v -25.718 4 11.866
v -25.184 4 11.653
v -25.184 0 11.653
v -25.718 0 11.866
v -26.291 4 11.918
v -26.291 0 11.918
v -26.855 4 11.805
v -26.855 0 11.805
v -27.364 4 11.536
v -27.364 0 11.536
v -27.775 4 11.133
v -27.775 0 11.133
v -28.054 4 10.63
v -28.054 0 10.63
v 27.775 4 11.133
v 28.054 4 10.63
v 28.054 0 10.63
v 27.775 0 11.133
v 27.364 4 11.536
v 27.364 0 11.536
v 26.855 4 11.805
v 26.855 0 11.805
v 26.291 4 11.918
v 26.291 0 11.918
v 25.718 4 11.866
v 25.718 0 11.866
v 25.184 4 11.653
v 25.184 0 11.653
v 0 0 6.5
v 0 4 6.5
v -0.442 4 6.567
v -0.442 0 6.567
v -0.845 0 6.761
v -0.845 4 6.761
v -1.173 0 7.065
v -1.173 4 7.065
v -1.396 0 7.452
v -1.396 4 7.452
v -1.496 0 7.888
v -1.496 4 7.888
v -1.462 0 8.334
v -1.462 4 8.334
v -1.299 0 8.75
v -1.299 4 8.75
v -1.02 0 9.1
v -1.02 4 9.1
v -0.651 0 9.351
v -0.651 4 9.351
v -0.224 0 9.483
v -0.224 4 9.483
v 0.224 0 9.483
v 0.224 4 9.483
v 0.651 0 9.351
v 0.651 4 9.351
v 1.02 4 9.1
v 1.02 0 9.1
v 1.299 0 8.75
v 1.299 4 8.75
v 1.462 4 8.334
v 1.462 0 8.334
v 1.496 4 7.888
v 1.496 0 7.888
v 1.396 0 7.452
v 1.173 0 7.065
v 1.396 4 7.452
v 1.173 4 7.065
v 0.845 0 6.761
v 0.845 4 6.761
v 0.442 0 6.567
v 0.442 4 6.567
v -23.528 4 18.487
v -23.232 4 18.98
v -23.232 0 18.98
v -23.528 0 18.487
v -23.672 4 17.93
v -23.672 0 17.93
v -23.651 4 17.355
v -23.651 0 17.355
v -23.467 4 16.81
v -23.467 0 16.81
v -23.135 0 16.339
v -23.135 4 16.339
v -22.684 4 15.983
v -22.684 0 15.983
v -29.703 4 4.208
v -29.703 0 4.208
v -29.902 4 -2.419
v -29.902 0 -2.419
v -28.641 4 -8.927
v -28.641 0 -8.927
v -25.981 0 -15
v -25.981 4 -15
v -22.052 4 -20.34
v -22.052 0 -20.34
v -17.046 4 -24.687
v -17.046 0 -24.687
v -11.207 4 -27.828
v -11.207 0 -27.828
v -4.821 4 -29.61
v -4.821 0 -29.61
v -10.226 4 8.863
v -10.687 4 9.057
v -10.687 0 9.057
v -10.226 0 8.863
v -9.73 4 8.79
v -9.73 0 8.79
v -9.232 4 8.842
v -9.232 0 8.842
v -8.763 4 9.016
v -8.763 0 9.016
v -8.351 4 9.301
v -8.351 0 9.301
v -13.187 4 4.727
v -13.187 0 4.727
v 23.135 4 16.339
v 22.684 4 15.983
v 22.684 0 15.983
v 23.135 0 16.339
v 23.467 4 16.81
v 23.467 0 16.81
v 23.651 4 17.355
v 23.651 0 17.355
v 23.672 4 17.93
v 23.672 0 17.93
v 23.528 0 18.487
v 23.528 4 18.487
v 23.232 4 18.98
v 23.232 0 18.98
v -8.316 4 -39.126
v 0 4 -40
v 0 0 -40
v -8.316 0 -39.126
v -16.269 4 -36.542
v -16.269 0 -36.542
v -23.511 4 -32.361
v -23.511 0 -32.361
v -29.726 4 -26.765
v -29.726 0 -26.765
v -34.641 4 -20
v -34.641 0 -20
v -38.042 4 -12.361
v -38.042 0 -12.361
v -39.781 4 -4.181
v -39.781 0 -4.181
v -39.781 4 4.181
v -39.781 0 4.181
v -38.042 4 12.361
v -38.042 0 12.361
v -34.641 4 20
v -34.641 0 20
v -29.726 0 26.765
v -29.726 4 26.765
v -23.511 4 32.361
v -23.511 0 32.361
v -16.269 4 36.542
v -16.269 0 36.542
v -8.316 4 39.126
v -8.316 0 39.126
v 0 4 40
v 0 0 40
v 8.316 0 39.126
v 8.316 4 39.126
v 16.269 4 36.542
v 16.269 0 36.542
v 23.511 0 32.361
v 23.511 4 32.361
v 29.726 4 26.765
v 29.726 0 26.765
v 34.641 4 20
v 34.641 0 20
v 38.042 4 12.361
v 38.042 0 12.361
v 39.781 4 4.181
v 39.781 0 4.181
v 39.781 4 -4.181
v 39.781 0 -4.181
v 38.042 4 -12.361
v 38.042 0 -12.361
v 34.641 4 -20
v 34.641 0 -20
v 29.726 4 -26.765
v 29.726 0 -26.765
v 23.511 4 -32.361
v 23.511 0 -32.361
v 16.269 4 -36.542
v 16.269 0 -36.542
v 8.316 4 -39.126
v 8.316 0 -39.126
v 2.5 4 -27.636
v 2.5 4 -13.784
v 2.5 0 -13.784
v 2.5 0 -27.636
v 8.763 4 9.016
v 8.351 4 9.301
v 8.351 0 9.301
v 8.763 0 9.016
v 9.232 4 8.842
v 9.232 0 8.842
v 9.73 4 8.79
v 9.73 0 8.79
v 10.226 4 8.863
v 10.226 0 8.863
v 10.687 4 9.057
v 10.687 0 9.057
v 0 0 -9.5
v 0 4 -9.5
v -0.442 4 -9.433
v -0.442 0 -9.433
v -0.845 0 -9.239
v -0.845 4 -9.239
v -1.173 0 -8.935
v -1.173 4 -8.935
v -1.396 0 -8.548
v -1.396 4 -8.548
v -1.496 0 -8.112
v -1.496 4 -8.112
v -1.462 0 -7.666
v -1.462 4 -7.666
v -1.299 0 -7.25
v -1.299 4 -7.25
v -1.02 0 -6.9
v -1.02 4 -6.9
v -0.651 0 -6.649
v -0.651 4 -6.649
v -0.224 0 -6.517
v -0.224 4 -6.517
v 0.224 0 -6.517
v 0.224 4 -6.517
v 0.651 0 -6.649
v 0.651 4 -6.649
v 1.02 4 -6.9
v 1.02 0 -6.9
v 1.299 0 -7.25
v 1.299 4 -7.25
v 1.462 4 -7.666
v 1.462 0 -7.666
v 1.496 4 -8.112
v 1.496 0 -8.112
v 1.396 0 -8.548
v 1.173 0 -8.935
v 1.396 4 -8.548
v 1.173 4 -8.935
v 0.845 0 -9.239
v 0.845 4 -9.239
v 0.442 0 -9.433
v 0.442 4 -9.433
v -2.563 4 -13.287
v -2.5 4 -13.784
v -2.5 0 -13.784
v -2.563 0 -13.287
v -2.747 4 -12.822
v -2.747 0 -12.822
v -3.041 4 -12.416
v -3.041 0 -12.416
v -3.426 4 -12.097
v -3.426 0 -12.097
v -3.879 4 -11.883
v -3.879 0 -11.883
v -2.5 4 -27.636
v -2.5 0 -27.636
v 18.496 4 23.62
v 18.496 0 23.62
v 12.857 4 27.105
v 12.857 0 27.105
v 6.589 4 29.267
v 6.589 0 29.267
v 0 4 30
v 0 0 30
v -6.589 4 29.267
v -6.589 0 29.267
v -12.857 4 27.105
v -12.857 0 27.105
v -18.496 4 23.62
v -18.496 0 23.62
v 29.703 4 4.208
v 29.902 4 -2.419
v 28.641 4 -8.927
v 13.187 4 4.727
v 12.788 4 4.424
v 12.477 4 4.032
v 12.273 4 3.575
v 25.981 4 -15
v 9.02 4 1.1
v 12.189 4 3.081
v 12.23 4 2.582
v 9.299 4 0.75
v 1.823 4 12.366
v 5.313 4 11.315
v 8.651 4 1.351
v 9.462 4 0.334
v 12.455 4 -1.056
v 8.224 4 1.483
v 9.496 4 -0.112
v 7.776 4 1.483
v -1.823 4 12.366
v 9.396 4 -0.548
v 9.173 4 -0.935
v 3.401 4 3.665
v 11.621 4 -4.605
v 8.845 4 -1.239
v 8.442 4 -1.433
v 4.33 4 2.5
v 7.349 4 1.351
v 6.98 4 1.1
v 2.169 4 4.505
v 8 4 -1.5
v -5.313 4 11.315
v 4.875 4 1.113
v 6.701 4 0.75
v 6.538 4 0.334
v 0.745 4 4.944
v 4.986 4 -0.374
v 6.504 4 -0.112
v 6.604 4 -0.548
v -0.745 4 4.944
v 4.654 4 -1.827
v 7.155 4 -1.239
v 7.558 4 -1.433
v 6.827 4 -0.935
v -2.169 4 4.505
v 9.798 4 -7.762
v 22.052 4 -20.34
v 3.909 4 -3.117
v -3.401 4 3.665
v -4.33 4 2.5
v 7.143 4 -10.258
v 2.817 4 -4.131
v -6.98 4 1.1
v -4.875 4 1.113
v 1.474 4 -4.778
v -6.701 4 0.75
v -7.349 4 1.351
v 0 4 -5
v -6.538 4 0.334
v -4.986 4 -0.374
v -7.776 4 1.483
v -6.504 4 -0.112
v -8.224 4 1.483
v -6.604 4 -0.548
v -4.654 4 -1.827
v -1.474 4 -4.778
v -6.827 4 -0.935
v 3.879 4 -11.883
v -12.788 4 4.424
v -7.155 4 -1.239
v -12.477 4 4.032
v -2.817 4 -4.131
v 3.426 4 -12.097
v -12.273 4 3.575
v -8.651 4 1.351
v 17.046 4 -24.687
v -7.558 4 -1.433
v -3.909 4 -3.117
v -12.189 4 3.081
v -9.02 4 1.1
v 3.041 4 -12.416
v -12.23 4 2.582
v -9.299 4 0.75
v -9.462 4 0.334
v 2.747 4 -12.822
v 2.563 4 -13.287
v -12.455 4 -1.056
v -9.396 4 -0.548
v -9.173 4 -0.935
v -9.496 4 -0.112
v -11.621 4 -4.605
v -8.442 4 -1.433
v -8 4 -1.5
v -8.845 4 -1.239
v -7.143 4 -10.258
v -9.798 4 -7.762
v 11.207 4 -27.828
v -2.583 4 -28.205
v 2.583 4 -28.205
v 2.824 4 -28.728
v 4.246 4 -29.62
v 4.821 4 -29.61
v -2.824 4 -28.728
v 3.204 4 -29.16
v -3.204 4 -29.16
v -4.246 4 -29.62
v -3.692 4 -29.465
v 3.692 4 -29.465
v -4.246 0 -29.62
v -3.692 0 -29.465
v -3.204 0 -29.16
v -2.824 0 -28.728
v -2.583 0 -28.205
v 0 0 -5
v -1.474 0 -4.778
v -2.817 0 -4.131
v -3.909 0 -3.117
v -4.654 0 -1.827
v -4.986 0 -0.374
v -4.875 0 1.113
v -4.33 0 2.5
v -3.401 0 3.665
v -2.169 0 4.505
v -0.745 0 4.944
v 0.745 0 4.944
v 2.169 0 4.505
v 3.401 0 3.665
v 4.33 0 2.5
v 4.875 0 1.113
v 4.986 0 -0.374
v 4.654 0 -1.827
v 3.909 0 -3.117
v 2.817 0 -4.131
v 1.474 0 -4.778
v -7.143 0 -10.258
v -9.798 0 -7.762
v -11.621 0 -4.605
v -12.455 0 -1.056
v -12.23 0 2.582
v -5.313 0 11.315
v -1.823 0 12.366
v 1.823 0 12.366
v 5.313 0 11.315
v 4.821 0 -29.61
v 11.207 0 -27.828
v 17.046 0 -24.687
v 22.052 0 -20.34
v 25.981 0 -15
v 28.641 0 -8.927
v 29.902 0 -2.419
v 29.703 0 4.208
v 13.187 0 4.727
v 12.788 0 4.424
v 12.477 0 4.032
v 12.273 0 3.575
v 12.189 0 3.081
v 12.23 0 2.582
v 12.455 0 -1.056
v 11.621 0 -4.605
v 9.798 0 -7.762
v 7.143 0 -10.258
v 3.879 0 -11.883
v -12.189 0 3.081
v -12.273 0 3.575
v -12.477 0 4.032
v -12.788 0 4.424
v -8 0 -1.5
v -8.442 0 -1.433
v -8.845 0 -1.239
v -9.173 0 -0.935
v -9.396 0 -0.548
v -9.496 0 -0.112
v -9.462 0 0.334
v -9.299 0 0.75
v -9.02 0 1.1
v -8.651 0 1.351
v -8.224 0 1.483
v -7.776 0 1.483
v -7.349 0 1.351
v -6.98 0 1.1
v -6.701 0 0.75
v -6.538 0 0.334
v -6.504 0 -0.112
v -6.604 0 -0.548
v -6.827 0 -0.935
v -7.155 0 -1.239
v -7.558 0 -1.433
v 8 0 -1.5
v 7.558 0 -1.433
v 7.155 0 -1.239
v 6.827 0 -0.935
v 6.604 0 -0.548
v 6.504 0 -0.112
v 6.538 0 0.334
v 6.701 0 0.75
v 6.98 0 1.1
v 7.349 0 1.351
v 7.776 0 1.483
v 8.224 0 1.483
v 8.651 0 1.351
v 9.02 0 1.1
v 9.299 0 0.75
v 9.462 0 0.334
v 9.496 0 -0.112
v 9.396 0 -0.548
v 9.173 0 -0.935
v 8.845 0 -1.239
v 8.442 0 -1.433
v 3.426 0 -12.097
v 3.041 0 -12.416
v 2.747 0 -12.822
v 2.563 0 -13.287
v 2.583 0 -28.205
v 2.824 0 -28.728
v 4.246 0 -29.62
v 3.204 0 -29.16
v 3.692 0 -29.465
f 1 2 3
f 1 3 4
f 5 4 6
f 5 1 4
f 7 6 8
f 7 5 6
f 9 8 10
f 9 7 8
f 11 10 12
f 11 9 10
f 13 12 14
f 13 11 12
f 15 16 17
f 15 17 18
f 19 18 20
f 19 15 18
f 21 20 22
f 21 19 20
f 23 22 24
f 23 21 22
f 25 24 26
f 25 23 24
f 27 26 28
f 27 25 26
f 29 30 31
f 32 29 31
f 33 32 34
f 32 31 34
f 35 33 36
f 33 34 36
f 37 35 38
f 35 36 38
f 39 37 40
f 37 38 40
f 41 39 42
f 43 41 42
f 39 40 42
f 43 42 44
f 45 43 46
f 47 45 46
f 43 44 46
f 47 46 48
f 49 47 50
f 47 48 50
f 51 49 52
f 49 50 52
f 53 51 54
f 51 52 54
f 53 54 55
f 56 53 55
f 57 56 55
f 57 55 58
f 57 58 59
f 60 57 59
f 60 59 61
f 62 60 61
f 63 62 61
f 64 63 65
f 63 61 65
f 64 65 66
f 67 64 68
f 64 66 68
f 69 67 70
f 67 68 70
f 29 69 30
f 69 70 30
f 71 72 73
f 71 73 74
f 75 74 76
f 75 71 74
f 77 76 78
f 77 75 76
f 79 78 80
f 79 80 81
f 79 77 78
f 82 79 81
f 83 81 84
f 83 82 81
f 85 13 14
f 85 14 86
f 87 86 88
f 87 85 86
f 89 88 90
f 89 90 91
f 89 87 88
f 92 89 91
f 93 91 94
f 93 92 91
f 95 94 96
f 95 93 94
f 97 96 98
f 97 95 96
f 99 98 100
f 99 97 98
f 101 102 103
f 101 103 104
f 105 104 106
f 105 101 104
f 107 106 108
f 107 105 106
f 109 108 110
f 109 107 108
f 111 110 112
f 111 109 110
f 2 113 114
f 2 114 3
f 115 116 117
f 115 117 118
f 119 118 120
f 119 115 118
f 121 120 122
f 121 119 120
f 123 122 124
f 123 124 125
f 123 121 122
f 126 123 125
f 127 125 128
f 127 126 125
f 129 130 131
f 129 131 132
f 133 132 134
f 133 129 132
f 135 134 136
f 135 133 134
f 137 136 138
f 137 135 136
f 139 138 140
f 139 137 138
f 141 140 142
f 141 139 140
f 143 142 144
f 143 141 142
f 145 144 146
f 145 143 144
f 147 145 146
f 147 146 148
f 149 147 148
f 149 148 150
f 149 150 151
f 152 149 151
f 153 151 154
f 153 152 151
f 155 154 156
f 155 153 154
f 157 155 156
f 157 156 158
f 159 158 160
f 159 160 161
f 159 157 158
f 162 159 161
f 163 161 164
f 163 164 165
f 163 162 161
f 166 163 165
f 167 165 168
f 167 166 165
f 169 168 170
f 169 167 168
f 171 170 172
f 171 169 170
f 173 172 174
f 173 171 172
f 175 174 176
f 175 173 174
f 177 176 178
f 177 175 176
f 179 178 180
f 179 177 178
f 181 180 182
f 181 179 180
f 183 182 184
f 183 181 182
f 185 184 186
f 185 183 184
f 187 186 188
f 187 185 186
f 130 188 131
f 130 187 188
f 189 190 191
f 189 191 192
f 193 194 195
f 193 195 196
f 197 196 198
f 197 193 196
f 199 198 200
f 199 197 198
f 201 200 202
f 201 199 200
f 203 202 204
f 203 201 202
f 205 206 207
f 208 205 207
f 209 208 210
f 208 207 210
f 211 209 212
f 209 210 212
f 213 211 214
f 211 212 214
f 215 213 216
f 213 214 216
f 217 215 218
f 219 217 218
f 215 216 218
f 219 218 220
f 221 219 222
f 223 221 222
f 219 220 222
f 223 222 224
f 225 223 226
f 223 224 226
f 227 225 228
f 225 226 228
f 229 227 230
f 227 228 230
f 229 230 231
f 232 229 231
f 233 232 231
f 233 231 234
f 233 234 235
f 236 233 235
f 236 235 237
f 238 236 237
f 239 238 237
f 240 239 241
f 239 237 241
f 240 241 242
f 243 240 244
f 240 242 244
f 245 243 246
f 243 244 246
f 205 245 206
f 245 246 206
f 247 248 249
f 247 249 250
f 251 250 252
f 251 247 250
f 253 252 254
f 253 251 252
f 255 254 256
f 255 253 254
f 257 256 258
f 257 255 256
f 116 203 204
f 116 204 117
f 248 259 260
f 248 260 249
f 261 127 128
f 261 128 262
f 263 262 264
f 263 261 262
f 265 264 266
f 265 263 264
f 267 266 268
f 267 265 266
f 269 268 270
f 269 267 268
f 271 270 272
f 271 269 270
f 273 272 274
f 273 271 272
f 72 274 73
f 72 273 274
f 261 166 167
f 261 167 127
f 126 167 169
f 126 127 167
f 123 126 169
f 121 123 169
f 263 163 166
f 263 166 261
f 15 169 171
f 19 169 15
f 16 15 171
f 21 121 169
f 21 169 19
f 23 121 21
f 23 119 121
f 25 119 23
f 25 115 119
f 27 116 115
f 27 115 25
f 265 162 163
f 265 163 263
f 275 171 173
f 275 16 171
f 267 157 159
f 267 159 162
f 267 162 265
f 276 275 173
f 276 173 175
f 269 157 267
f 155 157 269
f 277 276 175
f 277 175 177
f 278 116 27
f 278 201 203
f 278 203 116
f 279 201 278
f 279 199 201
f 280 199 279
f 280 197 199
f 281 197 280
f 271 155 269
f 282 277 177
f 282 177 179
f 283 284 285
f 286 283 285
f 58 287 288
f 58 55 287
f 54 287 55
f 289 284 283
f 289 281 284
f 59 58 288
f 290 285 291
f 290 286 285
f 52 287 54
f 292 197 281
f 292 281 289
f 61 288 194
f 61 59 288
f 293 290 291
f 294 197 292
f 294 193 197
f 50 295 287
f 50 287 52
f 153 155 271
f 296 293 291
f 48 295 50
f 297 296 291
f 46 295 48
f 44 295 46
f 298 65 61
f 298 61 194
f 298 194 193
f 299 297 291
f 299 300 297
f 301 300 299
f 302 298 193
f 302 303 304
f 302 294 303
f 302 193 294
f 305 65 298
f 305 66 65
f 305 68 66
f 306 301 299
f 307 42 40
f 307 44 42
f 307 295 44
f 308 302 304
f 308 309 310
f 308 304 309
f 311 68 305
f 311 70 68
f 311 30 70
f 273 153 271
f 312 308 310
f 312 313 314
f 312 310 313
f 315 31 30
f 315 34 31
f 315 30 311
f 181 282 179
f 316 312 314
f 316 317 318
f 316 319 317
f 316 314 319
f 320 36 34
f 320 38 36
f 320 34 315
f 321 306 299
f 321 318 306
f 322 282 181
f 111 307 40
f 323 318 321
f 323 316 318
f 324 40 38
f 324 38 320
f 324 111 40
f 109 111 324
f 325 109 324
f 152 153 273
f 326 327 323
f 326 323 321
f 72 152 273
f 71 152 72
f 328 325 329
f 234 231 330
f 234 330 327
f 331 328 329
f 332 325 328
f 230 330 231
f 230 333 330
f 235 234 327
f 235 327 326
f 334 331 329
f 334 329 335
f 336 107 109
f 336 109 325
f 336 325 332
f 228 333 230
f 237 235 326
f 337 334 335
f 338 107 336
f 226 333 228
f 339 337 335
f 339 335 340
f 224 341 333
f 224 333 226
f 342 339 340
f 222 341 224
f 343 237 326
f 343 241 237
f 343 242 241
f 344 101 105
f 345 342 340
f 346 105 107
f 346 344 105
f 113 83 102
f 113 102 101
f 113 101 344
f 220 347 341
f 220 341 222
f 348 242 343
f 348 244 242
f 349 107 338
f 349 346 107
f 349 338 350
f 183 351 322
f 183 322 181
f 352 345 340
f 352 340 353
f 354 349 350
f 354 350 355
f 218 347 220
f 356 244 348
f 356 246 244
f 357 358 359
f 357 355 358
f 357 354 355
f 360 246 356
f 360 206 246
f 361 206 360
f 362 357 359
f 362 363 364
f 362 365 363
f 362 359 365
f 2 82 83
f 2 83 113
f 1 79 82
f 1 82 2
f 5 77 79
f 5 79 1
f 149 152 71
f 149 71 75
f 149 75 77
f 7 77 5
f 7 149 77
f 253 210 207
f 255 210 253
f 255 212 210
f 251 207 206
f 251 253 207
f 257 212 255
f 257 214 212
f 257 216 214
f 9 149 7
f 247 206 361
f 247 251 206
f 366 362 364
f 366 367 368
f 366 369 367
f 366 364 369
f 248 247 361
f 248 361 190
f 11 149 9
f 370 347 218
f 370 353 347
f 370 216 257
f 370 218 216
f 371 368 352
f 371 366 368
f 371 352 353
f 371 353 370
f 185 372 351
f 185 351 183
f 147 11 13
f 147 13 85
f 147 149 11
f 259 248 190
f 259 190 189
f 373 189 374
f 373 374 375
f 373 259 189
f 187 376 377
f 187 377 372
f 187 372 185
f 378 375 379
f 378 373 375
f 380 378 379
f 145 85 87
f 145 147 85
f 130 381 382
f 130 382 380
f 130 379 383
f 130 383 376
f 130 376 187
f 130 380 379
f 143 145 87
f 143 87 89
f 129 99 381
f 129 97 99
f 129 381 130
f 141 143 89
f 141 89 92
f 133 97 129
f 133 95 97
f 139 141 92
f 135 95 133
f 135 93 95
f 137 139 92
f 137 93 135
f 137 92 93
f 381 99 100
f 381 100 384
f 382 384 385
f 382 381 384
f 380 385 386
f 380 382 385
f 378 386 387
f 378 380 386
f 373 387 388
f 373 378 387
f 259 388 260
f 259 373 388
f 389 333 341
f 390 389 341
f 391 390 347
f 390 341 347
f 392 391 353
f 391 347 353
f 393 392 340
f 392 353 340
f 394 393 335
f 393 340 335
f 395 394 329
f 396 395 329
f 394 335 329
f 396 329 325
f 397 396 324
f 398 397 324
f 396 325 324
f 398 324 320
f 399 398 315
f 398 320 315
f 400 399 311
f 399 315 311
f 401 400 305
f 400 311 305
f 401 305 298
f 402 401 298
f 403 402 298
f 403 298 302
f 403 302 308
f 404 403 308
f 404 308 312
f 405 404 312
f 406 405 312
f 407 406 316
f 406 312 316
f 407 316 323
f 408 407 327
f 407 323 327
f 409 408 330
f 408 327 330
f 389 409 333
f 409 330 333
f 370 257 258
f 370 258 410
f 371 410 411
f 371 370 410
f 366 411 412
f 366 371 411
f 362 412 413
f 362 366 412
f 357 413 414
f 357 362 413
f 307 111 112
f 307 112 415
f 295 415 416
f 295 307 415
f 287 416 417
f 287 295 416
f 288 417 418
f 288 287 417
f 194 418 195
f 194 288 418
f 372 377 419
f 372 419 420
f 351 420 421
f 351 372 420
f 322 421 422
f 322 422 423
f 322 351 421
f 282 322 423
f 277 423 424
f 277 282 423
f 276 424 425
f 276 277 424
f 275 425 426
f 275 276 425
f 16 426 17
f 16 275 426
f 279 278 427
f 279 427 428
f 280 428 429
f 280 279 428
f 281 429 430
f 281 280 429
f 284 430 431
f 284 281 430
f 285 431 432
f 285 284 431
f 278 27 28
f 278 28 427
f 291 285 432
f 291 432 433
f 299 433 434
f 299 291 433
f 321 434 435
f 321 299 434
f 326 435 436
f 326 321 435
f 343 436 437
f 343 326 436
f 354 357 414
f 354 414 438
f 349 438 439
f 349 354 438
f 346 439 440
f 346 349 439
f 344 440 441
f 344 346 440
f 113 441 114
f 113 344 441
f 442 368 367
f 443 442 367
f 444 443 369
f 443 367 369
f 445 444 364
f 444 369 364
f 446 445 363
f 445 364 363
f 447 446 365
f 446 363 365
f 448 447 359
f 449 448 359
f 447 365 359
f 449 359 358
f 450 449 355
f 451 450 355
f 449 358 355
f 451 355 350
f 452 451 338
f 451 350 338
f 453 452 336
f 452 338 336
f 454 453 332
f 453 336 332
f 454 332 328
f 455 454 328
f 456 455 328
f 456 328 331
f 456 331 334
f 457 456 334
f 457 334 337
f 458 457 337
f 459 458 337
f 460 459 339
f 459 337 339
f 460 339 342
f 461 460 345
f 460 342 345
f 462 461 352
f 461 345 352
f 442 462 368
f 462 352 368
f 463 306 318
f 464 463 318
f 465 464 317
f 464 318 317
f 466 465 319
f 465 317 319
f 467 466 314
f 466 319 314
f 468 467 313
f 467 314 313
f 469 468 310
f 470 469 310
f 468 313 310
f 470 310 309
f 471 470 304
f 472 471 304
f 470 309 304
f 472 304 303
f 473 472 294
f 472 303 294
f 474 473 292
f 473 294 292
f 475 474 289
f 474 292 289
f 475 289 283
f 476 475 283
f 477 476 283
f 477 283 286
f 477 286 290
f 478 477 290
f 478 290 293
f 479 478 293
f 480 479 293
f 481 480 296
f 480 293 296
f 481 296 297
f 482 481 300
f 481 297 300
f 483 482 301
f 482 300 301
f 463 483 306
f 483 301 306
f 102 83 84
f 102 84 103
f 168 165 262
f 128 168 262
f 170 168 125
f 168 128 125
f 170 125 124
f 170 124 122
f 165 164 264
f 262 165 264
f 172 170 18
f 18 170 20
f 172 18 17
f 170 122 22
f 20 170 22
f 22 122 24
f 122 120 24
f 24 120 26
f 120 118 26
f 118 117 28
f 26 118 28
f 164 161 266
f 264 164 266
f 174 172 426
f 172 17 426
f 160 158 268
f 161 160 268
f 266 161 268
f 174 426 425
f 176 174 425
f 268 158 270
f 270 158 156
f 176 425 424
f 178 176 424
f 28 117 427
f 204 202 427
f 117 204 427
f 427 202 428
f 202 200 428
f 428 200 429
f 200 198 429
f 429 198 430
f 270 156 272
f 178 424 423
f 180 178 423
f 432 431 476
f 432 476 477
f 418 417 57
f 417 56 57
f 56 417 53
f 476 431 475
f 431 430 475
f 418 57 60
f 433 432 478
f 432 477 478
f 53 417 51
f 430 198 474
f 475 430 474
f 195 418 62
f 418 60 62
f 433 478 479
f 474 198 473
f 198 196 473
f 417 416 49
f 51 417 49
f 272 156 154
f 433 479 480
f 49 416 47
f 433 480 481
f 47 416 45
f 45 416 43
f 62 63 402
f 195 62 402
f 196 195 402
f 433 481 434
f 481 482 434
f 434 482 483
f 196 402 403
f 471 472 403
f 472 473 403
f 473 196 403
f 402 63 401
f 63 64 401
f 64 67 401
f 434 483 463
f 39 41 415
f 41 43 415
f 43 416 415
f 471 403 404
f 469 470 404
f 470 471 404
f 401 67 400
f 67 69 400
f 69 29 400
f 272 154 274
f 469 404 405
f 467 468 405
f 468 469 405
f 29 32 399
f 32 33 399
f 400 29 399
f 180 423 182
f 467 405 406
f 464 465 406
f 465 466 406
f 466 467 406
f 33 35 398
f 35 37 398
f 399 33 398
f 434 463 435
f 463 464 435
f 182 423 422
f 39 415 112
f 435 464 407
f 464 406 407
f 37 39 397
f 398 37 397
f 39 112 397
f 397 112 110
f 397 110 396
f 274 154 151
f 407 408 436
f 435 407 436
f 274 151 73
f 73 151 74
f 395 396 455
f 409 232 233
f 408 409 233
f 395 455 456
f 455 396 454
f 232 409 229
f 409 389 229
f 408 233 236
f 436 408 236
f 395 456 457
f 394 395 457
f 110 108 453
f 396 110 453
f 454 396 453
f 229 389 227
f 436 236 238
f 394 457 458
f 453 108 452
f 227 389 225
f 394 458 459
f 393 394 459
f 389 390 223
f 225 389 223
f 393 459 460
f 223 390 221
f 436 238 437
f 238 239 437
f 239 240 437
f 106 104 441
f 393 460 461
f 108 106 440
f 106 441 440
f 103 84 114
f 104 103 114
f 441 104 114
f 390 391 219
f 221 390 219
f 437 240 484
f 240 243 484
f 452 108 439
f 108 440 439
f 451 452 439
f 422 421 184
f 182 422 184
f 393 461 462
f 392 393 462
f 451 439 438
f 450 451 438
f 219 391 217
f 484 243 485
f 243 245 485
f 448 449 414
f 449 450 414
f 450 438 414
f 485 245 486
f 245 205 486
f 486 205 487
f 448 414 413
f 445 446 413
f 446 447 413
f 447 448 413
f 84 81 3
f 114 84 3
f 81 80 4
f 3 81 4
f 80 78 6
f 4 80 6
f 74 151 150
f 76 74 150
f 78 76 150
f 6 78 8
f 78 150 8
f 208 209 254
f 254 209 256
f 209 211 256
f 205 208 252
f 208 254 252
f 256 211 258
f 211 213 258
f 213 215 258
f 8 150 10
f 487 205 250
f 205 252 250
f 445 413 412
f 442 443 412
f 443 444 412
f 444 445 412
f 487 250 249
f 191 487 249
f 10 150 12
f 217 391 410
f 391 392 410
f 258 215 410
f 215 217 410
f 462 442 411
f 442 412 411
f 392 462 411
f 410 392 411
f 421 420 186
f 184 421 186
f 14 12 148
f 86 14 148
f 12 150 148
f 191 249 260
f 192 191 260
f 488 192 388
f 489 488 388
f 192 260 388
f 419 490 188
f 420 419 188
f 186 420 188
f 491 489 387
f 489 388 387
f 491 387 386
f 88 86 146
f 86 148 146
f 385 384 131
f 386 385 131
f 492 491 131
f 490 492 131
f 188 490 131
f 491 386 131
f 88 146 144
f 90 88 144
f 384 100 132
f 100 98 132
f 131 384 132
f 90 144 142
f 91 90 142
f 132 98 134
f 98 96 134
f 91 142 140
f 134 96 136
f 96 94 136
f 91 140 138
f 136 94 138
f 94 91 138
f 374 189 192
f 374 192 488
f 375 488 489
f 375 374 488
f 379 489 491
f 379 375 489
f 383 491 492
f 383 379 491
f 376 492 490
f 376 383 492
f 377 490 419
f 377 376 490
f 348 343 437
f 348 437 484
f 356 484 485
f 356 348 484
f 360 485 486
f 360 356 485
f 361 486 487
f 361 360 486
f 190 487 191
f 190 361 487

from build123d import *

# Parameters (mm, degrees)
ESBO_O1_R                = 40
ESBO_O1_R_2              = 1.5
ESBO_O1_R_3              = 5
RESSALTO_EXTRUS_O1_DEPTH = 4


with BuildPart() as part:
    # Esboço1 → Ressalto-extrusão1 (new body)
    with BuildSketch(Plane(origin=(0, 4, 0), x_dir=(1, 0, 0), z_dir=(0, 1, 0))):
        with Locations(Location((0, 0, 0), (0, 0, 90))):
            Circle(ESBO_O1_R)
        with Locations(Location((-8, 0, 0), (0, 0, 90))):
            Circle(ESBO_O1_R_2, mode=Mode.SUBTRACT)
        with Locations(Location((0, -8, 0), (0, 0, 90))):
            Circle(ESBO_O1_R_2, mode=Mode.SUBTRACT)
        with Locations(Location((8, 0, 0), (0, 0, 90))):
            Circle(ESBO_O1_R_2, mode=Mode.SUBTRACT)
        with Locations(Location((0, 8, 0), (0, 0, 90))):
            Circle(ESBO_O1_R_2, mode=Mode.SUBTRACT)
        with Locations(Location((0, 0, 0), (0, 0, 90))):
            Circle(ESBO_O1_R_3, mode=Mode.SUBTRACT)
        with BuildLine():
            Line((-2.5, 27.636027211), (-2.5, 13.784048752))
            ThreePointArc((-2.5, 13.784048752), (-2.881145573, 12.609608313), (-3.879310345, 11.882800648))
            ThreePointArc((-3.879310345, 11.882800648), (-10.825317547, 6.25), (-12.230462402, -2.581819016))
            ThreePointArc((-12.230462402, -2.581819016), (-12.360813917, -3.809658898), (-13.187336386, -4.726960867))
            Line((-13.187336386, -4.726960867), (-25.183501624, -11.652950096))
            ThreePointArc((-25.183501624, -11.652950096), (-26.855199812, -11.804730901), (-28.05375174, -10.629534952))
            ThreePointArc((-28.05375174, -10.629534952), (-25.980762114, 15), (-4.821428571, 29.610029155))
            ThreePointArc((-4.821428571, 29.610029155), (-3.204403061, 29.159650711), (-2.5, 27.636027211))
        make_face(mode=Mode.SUBTRACT)
        with BuildLine():
            Line((25.183501624, -11.652950096), (13.187336386, -4.726960867))
            ThreePointArc((13.187336386, -4.726960867), (12.360813917, -3.809658898), (12.230462402, -2.581819016))
            ThreePointArc((12.230462402, -2.581819016), (10.825317547, 6.25), (3.879310345, 11.882800648))
            ThreePointArc((3.879310345, 11.882800648), (2.881145573, 12.609608313), (2.5, 13.784048752))
            Line((2.5, 13.784048752), (2.5, 27.636027211))
            ThreePointArc((2.5, 27.636027211), (3.204403061, 29.159650711), (4.821428571, 29.610029155))
            ThreePointArc((4.821428571, 29.610029155), (25.980762114, 15), (28.05375174, -10.629534952))
            ThreePointArc((28.05375174, -10.629534952), (26.855199812, -11.804730901), (25.183501624, -11.652950096))
        make_face(mode=Mode.SUBTRACT)
        with BuildLine():
            Line((10.687336386, -9.057087886), (22.683501624, -15.983077115))
            ThreePointArc((22.683501624, -15.983077115), (23.650796751, -17.35491981), (23.232323169, -18.980494203))
            ThreePointArc((23.232323169, -18.980494203), (0, -30), (-23.232323169, -18.980494203))
            ThreePointArc((-23.232323169, -18.980494203), (-23.650796751, -17.35491981), (-22.683501624, -15.983077115))
            Line((-22.683501624, -15.983077115), (-10.687336386, -9.057087886))
            ThreePointArc((-10.687336386, -9.057087886), (-9.479668344, -8.799949415), (-8.351152057, -9.300981632))
            ThreePointArc((-8.351152057, -9.300981632), (0, -12.5), (8.351152057, -9.300981632))
            ThreePointArc((8.351152057, -9.300981632), (9.479668344, -8.799949415), (10.687336386, -9.057087886))
        make_face(mode=Mode.SUBTRACT)
    extrude(amount=-RESSALTO_EXTRUS_O1_DEPTH)


solid = part.part
